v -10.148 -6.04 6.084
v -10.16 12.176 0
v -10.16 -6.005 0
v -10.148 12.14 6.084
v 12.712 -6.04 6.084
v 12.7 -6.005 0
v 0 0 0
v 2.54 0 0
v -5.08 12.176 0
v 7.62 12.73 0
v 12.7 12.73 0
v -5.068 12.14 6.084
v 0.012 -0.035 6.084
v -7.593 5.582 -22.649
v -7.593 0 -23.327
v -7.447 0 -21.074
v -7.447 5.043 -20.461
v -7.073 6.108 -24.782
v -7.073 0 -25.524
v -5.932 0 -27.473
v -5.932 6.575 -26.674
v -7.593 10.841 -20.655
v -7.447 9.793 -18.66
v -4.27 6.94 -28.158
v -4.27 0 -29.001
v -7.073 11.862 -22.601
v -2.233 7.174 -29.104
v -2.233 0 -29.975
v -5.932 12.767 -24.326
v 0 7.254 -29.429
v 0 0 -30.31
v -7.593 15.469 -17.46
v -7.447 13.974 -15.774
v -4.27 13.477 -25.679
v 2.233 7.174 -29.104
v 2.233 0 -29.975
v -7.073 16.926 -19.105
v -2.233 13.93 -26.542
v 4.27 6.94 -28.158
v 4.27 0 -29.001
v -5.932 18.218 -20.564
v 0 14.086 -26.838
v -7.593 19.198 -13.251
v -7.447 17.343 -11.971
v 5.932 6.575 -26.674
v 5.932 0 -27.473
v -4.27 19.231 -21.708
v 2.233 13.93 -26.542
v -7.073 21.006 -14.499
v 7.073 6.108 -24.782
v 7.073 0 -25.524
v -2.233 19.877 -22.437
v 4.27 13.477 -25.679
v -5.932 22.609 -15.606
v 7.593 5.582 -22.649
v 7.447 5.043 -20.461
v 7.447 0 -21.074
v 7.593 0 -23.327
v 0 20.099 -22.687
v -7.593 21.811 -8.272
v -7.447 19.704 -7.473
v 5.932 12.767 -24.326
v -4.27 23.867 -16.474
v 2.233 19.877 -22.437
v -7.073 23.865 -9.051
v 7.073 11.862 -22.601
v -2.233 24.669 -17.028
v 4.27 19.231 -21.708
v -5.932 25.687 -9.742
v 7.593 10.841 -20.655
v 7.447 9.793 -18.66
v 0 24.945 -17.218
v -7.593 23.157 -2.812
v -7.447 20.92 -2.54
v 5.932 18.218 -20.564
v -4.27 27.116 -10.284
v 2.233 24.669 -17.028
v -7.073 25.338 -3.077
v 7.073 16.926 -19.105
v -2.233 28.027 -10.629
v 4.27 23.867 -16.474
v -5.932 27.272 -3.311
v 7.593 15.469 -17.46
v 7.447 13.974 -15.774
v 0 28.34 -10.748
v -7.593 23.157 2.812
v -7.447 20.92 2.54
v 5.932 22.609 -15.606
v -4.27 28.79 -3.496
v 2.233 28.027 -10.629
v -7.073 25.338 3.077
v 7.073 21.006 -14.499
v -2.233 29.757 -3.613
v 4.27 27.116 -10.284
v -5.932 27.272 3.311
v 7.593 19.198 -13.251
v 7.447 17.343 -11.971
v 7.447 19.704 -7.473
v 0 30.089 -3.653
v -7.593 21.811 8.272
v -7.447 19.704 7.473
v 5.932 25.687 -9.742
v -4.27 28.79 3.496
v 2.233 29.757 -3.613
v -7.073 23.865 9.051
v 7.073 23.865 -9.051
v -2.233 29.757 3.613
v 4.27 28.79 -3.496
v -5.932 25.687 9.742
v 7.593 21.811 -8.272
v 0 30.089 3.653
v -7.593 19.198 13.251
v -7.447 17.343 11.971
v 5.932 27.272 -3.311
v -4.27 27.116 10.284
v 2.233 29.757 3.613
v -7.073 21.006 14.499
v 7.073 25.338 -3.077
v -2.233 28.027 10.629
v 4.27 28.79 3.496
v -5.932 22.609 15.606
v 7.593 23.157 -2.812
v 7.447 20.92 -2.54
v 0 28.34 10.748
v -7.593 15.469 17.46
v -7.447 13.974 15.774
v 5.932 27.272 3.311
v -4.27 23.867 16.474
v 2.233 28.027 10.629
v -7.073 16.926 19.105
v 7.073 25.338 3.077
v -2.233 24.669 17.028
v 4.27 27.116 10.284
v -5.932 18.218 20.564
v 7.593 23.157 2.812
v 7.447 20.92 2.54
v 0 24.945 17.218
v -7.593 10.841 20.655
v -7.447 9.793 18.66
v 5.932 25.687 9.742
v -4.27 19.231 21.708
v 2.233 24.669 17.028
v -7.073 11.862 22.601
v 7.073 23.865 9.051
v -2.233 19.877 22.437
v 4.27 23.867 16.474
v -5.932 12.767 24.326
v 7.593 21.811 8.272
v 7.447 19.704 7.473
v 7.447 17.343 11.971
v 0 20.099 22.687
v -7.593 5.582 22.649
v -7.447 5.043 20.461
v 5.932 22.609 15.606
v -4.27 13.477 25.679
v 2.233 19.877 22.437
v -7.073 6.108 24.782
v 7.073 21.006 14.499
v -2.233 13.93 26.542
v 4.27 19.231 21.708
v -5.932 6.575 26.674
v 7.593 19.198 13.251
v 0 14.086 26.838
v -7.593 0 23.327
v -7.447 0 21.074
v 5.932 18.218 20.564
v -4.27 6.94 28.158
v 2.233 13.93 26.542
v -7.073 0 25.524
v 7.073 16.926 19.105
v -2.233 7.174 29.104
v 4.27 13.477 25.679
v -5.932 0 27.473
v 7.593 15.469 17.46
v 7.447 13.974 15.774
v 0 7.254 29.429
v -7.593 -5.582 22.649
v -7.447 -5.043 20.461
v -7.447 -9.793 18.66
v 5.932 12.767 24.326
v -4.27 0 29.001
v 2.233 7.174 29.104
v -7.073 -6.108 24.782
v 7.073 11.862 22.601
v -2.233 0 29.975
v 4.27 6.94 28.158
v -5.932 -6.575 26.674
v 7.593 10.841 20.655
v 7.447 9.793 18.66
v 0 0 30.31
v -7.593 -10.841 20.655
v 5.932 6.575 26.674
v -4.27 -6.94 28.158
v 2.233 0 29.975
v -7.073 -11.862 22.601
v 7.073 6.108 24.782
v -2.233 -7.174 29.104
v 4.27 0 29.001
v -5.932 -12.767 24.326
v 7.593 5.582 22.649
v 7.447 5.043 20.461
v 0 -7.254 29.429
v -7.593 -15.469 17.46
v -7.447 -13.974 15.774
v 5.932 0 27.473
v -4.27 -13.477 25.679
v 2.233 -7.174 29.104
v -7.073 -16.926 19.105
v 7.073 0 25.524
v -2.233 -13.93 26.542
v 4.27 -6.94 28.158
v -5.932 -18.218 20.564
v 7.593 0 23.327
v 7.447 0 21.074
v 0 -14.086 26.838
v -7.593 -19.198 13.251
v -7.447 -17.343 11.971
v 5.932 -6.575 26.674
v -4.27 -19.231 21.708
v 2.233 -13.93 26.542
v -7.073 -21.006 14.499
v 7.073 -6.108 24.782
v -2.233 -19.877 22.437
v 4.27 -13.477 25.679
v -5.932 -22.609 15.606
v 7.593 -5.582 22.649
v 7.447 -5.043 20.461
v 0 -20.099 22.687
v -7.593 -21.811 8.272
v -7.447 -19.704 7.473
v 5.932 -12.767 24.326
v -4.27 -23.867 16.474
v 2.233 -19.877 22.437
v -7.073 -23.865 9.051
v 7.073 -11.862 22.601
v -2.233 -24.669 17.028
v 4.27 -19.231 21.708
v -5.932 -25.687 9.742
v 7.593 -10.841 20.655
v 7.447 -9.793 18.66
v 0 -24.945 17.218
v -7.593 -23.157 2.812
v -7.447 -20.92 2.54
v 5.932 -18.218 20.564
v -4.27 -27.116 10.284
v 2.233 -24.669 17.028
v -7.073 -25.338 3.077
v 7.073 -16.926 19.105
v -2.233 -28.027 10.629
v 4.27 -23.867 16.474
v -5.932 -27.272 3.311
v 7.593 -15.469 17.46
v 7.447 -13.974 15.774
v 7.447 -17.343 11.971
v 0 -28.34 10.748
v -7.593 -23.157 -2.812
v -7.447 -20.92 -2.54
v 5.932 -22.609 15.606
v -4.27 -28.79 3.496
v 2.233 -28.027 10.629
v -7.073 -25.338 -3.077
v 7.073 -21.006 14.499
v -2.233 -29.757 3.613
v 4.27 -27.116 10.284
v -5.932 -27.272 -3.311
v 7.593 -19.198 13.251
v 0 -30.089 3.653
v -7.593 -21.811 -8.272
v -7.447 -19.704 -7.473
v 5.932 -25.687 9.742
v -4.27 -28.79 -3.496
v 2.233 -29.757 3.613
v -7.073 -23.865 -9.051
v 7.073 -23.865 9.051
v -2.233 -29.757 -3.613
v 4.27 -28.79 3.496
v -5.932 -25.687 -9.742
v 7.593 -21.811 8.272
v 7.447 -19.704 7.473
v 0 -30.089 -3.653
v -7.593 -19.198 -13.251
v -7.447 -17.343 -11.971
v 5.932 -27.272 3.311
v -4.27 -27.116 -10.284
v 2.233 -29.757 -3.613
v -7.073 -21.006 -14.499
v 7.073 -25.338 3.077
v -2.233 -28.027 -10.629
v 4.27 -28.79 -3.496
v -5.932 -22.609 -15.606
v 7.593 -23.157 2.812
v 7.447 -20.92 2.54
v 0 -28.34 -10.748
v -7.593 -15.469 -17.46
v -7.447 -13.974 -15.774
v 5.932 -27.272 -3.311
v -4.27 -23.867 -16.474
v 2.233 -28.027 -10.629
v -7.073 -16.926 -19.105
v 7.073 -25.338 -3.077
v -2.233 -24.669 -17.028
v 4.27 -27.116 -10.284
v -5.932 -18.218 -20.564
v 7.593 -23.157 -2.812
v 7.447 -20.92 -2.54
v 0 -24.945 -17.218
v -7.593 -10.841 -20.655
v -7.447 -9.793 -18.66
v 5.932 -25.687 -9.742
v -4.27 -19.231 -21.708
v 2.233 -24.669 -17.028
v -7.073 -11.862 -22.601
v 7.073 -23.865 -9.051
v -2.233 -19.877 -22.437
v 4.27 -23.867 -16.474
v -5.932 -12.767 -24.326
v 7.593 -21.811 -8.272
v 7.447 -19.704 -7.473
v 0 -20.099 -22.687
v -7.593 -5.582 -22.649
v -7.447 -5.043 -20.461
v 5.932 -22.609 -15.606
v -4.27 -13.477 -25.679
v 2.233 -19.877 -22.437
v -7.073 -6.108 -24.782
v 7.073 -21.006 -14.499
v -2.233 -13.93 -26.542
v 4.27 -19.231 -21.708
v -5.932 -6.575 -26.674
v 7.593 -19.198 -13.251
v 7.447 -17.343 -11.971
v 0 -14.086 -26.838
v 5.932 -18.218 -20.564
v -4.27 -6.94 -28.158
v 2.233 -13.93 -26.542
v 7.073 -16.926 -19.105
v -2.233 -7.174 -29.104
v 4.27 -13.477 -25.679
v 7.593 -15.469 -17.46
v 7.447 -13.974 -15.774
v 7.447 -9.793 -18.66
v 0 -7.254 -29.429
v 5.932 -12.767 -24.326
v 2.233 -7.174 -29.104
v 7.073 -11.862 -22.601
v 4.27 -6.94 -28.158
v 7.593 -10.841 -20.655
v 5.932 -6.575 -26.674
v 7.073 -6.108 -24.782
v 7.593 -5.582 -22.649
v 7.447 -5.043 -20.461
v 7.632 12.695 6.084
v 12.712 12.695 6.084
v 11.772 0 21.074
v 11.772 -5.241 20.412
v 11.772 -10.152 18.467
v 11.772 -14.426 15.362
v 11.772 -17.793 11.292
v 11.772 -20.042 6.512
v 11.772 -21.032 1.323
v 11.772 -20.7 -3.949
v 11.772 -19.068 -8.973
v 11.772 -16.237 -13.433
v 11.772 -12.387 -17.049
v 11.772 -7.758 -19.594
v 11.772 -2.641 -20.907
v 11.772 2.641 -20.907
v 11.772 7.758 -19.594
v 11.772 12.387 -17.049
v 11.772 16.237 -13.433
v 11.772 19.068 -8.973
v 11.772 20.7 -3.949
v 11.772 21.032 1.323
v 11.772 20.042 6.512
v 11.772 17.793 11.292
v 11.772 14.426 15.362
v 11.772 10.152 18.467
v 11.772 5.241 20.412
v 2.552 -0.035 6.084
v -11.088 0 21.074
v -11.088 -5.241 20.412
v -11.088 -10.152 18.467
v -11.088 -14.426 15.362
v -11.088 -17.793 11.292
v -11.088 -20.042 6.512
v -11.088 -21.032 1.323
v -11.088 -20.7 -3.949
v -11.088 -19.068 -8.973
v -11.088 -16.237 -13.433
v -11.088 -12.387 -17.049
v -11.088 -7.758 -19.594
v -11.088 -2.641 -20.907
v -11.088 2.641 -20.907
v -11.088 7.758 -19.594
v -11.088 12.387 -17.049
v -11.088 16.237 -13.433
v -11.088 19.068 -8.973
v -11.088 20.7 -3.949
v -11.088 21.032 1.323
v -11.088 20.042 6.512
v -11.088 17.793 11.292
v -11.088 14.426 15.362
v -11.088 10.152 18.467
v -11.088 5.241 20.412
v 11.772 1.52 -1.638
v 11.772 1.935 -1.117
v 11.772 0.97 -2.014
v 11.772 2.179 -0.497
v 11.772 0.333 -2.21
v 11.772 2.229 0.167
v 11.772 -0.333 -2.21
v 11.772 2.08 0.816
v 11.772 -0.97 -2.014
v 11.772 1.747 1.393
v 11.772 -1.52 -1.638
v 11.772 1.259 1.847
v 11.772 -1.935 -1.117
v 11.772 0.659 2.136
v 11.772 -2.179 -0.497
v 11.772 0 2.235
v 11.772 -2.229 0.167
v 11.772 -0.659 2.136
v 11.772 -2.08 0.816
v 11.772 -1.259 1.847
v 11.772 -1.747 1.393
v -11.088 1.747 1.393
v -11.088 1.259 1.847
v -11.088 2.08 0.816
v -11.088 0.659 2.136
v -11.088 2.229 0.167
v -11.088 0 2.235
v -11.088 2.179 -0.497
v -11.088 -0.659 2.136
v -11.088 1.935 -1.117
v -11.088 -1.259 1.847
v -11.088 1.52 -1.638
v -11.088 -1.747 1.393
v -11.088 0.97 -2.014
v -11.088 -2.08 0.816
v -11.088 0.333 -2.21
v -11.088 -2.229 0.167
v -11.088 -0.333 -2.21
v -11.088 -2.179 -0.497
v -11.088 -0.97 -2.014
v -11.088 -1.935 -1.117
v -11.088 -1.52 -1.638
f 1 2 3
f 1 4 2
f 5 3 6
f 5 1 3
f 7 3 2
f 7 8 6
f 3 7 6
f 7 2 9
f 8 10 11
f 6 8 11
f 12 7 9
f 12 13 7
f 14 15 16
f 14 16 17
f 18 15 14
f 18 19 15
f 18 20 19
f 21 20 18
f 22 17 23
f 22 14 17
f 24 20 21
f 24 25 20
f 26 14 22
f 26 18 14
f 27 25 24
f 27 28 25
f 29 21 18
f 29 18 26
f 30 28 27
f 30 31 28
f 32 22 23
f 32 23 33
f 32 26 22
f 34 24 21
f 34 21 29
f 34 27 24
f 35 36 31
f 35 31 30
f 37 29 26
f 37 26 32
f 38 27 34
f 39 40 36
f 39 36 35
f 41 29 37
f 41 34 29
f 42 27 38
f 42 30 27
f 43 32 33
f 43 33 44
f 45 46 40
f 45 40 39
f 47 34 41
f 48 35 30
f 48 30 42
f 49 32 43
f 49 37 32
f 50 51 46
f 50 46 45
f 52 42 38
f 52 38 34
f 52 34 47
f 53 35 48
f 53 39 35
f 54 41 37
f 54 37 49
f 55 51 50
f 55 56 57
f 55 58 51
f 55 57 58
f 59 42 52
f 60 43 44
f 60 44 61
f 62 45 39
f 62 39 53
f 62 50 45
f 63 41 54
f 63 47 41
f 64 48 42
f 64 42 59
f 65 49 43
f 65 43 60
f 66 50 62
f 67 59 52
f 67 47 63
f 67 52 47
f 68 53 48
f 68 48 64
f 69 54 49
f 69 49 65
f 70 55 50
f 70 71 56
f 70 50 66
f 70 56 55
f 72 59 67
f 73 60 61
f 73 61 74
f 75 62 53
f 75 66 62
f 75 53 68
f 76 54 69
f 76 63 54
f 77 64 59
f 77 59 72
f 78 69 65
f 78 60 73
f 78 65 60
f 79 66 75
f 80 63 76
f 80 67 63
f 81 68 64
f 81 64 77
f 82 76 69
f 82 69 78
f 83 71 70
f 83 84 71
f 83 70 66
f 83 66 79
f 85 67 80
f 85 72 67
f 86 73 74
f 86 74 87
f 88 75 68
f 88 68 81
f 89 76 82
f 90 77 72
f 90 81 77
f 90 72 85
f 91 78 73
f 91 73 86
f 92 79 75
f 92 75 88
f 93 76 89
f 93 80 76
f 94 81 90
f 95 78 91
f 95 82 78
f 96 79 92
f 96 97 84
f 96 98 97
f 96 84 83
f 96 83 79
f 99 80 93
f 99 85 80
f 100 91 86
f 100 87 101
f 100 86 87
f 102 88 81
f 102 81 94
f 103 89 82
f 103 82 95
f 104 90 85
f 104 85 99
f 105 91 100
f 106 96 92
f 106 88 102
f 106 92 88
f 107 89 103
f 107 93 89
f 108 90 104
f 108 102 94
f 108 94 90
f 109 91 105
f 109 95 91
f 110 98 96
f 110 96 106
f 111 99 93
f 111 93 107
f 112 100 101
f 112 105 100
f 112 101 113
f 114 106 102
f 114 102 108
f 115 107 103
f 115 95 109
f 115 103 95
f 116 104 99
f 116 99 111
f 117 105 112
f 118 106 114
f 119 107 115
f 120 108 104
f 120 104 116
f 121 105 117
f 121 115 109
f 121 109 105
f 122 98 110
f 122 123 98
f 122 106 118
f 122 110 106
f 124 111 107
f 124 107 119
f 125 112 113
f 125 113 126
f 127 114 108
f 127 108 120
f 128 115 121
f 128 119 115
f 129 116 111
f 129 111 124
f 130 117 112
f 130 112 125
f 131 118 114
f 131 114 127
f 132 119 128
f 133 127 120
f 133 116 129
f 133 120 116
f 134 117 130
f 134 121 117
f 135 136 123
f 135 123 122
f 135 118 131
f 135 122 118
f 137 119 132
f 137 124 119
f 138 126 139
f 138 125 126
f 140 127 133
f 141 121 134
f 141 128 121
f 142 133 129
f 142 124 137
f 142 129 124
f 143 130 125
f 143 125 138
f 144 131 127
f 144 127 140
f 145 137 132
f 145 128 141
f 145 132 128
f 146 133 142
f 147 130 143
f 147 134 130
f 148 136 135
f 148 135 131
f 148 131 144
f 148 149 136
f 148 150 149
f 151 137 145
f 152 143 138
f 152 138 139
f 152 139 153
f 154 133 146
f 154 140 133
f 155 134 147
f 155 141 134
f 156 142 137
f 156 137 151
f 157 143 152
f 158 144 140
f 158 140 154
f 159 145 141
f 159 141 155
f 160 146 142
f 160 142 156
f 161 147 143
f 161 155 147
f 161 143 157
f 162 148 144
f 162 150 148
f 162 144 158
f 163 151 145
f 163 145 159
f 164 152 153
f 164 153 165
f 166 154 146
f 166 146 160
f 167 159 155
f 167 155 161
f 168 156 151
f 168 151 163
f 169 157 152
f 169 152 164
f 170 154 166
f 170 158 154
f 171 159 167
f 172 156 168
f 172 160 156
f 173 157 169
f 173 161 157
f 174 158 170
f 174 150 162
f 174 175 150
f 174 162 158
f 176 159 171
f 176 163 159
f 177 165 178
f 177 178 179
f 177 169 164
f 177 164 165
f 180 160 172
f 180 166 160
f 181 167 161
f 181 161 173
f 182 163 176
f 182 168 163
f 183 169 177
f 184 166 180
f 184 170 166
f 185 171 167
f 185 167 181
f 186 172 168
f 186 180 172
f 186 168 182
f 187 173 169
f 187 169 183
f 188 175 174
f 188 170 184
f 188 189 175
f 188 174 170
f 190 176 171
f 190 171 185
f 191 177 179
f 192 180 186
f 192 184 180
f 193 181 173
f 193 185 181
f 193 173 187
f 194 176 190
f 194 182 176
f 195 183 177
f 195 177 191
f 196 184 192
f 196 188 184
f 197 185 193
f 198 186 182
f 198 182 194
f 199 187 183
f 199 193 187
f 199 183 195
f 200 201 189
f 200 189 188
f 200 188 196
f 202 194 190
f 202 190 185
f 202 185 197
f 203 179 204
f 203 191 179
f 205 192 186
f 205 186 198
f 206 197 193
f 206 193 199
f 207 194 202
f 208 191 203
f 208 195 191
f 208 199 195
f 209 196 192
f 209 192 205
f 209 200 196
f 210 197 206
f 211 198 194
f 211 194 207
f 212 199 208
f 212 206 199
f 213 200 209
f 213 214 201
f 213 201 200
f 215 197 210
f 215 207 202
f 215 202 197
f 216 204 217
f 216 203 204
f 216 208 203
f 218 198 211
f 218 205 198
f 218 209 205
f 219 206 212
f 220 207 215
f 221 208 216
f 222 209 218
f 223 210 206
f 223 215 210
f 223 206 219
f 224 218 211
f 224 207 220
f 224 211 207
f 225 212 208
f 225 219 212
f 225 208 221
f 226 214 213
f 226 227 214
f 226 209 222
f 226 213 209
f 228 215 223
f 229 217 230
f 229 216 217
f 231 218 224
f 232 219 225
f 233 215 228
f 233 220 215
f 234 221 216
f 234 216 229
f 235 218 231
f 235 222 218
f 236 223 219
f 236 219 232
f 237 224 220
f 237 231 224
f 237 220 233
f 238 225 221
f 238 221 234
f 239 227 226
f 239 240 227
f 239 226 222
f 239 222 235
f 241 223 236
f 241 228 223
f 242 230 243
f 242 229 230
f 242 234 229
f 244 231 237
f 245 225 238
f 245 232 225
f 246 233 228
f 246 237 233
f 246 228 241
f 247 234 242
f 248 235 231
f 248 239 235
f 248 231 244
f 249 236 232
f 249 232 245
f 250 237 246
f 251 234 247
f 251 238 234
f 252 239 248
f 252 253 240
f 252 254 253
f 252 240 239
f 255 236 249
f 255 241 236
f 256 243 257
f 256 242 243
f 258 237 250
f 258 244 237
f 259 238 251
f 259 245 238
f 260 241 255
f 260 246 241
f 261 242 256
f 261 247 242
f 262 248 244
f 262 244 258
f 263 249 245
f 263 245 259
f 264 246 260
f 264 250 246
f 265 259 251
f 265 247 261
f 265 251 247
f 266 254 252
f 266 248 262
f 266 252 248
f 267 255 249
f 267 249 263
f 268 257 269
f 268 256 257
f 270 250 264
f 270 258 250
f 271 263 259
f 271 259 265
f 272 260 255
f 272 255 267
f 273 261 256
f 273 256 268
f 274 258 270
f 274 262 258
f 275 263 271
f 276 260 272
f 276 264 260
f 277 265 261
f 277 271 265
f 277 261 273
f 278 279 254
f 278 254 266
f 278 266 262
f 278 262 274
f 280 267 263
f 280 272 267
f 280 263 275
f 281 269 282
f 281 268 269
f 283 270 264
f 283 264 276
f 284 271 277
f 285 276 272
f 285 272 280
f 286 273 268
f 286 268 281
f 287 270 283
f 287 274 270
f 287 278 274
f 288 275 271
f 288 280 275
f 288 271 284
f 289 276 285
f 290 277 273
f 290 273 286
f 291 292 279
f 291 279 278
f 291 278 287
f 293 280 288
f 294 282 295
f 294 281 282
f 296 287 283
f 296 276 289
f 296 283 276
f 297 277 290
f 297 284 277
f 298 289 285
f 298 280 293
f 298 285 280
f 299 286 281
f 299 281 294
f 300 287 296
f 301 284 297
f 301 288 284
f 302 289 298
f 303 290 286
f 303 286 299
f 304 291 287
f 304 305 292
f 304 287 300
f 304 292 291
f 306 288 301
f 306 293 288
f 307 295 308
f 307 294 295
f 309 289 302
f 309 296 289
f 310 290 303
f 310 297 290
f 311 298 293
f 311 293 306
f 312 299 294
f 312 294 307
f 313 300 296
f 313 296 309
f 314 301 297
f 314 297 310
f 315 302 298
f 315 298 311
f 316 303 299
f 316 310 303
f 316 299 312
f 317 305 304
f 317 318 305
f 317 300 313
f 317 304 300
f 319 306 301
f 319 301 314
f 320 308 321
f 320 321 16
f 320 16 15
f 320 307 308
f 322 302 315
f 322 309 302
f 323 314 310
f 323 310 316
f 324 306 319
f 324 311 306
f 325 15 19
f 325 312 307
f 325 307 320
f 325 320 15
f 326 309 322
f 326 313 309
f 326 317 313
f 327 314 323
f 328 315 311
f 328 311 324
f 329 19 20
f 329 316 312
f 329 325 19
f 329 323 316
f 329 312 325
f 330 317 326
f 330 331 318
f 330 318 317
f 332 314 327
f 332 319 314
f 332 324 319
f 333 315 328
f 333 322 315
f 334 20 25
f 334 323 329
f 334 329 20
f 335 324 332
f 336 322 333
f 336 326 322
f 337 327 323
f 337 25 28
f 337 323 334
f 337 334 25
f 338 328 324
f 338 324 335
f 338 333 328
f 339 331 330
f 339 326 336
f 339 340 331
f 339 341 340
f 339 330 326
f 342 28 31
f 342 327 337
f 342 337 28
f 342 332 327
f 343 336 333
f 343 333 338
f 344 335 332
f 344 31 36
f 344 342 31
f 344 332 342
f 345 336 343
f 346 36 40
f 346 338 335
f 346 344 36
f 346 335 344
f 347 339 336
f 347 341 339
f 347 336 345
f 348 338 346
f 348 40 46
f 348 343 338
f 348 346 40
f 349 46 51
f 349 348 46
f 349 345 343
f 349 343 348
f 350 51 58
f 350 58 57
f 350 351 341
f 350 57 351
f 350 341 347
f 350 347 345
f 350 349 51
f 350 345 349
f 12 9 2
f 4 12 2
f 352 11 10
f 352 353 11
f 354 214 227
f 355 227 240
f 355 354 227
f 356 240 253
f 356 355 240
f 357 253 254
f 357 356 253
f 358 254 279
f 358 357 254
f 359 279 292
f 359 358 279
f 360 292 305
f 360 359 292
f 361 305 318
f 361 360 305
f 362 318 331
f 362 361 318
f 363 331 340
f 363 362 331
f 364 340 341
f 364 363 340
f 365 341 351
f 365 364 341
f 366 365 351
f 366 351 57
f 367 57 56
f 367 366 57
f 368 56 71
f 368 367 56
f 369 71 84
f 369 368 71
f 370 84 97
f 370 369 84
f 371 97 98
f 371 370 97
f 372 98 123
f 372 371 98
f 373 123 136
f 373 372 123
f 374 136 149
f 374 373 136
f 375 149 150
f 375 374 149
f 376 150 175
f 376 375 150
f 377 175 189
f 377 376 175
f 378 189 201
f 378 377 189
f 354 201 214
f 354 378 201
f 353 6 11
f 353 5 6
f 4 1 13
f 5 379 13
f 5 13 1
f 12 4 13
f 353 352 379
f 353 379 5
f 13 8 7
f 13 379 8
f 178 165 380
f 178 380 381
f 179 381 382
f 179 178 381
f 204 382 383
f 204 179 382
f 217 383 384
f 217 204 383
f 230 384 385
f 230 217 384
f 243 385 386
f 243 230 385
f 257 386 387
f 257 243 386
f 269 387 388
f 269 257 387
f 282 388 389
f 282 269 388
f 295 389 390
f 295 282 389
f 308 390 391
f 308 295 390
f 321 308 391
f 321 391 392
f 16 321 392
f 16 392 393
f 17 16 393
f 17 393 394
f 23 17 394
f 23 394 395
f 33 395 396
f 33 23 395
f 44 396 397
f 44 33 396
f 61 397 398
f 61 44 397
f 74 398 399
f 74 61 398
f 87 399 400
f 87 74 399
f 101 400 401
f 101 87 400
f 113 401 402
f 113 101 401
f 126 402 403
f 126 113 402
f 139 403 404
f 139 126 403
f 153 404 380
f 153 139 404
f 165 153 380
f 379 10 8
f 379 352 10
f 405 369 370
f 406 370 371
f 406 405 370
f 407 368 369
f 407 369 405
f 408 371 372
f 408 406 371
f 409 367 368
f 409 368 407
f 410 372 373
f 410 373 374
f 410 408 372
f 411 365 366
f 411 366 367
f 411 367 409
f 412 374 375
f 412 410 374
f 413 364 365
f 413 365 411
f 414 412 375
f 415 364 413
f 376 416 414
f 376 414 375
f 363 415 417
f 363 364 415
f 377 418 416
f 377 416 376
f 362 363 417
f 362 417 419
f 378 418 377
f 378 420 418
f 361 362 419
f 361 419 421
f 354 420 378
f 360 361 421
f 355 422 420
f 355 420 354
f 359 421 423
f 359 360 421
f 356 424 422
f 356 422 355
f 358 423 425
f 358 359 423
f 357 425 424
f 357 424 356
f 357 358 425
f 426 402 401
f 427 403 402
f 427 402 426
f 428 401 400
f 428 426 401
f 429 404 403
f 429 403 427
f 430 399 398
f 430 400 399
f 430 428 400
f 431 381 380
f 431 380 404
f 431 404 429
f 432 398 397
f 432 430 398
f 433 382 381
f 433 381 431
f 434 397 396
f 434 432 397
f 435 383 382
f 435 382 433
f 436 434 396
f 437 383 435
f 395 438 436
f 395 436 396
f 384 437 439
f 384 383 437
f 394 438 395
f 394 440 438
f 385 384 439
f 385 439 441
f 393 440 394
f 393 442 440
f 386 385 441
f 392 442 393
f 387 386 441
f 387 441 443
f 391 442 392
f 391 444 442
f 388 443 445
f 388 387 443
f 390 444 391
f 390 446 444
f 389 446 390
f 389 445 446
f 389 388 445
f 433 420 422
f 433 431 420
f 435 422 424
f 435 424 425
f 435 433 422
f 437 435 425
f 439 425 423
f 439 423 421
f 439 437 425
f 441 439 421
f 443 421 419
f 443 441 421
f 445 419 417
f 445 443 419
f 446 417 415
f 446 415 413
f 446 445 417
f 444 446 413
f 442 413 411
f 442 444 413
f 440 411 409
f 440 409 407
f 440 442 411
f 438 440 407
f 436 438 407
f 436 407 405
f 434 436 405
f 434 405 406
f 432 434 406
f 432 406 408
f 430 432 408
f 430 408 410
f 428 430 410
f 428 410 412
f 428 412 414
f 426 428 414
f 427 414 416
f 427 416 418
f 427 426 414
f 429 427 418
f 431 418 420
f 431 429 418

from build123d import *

# Parameters (mm, degrees)
SWEEP2_PROFILE_R = 7.62


with BuildPart() as part:
    # Boundary3: read off the stored shape, not the designer's step
    # Boundary3: loft between two sections, ruled curve by curve
    boundary3_from = [
        Edge.make_line((-10.16, 12.175576631, 0), (-10.16, -6.00529912, 0)),
        Edge.make_line((-10.16, -6.00529912, 0), (12.7, -6.00529912, 0)),
        Edge.make_line((12.7, -6.00529912, 0), (12.7, 12.73038731, 0)),
        Edge.make_line((12.7, 12.73038731, 0), (7.62, 12.73038731, 0)),
        Edge.make_line((7.62, 12.73038731, 0), (2.54, 0, 0)),
        Edge.make_line((2.54, 0, 0), (0, 0, 0)),
        Edge.make_line((0, 0, 0), (-5.08, 12.175576631, 0)),
        Edge.make_line((-5.08, 12.175576631, 0), (-10.16, 12.175576631, 0)),
    ]
    boundary3_to = [
        Edge.make_line((-10.147545464, 12.140427218, 6.083823129), (-10.147545464, -6.040448532, 6.083823129)),
        Edge.make_line((-10.147545464, -6.040448532, 6.083823129), (12.712454536, -6.040448532, 6.083823129)),
        Edge.make_line((12.712454536, -6.040448532, 6.083823129), (12.712454536, 12.695237898, 6.083823129)),
        Edge.make_line((12.712454536, 12.695237898, 6.083823129), (7.632454536, 12.695237898, 6.083823129)),
        Edge.make_line((7.632454536, 12.695237898, 6.083823129), (2.552454536, -0.035149412, 6.083823129)),
        Edge.make_line((2.552454536, -0.035149412, 6.083823129), (0.012454536, -0.035149412, 6.083823129)),
        Edge.make_line((0.012454536, -0.035149412, 6.083823129), (-5.067545464, 12.140427218, 6.083823129)),
        Edge.make_line((-5.067545464, 12.140427218, 6.083823129), (-10.147545464, 12.140427218, 6.083823129)),
    ]
    boundary3 = Solid(Shell([*[Face.make_surface_from_curves(boundary3_from[k], boundary3_to[k]) for k in range(8)], Face(Wire(boundary3_from)), Face(Wire(boundary3_to))]))
    add(boundary3)


with BuildPart() as body_2:
    # Sketch2 → Revolve2 (revolve)
    with BuildSketch(Plane.XY, mode=Mode.PRIVATE) as revolve2_sk:
        Polygon((-11.087525715, 21.073570044), (-6.007525715, 21.073570044), (-0.927525715, 15.273308854), (1.612474285, 15.273308854), (6.692474285, 21.073570044), (11.772474285, 21.073570044), (11.772474285, 2.234828231), (-11.087525715, 2.234828231), align=None)
    revolve(revolve2_sk.sketch.rotate(Axis((-11.087525715, 0, 0), (1, 0, 0)), 90), axis=Axis((-11.087525715, 0, 0), (1, 0, 0)))

    # Sweep2: sweep along a path in Sketch3
    with BuildLine(Plane(origin=(0, 0, 0), x_dir=(0, 0, -1), z_dir=(1, 0, 0))) as sweep2_path:
        CenterArc((0, 0), 22.689926061, 0, 360)
    # Sweep2 profile (on start of the path) → Sweep2 (sweep)
    with BuildSketch(Plane(origin=(0, 0, -22.689926061), x_dir=(0, 0, 1), z_dir=(0, 1, 0))):
        Circle(SWEEP2_PROFILE_R)
    sweep(path=sweep2_path.line)


solid = Compound([part.part, body_2.part])
